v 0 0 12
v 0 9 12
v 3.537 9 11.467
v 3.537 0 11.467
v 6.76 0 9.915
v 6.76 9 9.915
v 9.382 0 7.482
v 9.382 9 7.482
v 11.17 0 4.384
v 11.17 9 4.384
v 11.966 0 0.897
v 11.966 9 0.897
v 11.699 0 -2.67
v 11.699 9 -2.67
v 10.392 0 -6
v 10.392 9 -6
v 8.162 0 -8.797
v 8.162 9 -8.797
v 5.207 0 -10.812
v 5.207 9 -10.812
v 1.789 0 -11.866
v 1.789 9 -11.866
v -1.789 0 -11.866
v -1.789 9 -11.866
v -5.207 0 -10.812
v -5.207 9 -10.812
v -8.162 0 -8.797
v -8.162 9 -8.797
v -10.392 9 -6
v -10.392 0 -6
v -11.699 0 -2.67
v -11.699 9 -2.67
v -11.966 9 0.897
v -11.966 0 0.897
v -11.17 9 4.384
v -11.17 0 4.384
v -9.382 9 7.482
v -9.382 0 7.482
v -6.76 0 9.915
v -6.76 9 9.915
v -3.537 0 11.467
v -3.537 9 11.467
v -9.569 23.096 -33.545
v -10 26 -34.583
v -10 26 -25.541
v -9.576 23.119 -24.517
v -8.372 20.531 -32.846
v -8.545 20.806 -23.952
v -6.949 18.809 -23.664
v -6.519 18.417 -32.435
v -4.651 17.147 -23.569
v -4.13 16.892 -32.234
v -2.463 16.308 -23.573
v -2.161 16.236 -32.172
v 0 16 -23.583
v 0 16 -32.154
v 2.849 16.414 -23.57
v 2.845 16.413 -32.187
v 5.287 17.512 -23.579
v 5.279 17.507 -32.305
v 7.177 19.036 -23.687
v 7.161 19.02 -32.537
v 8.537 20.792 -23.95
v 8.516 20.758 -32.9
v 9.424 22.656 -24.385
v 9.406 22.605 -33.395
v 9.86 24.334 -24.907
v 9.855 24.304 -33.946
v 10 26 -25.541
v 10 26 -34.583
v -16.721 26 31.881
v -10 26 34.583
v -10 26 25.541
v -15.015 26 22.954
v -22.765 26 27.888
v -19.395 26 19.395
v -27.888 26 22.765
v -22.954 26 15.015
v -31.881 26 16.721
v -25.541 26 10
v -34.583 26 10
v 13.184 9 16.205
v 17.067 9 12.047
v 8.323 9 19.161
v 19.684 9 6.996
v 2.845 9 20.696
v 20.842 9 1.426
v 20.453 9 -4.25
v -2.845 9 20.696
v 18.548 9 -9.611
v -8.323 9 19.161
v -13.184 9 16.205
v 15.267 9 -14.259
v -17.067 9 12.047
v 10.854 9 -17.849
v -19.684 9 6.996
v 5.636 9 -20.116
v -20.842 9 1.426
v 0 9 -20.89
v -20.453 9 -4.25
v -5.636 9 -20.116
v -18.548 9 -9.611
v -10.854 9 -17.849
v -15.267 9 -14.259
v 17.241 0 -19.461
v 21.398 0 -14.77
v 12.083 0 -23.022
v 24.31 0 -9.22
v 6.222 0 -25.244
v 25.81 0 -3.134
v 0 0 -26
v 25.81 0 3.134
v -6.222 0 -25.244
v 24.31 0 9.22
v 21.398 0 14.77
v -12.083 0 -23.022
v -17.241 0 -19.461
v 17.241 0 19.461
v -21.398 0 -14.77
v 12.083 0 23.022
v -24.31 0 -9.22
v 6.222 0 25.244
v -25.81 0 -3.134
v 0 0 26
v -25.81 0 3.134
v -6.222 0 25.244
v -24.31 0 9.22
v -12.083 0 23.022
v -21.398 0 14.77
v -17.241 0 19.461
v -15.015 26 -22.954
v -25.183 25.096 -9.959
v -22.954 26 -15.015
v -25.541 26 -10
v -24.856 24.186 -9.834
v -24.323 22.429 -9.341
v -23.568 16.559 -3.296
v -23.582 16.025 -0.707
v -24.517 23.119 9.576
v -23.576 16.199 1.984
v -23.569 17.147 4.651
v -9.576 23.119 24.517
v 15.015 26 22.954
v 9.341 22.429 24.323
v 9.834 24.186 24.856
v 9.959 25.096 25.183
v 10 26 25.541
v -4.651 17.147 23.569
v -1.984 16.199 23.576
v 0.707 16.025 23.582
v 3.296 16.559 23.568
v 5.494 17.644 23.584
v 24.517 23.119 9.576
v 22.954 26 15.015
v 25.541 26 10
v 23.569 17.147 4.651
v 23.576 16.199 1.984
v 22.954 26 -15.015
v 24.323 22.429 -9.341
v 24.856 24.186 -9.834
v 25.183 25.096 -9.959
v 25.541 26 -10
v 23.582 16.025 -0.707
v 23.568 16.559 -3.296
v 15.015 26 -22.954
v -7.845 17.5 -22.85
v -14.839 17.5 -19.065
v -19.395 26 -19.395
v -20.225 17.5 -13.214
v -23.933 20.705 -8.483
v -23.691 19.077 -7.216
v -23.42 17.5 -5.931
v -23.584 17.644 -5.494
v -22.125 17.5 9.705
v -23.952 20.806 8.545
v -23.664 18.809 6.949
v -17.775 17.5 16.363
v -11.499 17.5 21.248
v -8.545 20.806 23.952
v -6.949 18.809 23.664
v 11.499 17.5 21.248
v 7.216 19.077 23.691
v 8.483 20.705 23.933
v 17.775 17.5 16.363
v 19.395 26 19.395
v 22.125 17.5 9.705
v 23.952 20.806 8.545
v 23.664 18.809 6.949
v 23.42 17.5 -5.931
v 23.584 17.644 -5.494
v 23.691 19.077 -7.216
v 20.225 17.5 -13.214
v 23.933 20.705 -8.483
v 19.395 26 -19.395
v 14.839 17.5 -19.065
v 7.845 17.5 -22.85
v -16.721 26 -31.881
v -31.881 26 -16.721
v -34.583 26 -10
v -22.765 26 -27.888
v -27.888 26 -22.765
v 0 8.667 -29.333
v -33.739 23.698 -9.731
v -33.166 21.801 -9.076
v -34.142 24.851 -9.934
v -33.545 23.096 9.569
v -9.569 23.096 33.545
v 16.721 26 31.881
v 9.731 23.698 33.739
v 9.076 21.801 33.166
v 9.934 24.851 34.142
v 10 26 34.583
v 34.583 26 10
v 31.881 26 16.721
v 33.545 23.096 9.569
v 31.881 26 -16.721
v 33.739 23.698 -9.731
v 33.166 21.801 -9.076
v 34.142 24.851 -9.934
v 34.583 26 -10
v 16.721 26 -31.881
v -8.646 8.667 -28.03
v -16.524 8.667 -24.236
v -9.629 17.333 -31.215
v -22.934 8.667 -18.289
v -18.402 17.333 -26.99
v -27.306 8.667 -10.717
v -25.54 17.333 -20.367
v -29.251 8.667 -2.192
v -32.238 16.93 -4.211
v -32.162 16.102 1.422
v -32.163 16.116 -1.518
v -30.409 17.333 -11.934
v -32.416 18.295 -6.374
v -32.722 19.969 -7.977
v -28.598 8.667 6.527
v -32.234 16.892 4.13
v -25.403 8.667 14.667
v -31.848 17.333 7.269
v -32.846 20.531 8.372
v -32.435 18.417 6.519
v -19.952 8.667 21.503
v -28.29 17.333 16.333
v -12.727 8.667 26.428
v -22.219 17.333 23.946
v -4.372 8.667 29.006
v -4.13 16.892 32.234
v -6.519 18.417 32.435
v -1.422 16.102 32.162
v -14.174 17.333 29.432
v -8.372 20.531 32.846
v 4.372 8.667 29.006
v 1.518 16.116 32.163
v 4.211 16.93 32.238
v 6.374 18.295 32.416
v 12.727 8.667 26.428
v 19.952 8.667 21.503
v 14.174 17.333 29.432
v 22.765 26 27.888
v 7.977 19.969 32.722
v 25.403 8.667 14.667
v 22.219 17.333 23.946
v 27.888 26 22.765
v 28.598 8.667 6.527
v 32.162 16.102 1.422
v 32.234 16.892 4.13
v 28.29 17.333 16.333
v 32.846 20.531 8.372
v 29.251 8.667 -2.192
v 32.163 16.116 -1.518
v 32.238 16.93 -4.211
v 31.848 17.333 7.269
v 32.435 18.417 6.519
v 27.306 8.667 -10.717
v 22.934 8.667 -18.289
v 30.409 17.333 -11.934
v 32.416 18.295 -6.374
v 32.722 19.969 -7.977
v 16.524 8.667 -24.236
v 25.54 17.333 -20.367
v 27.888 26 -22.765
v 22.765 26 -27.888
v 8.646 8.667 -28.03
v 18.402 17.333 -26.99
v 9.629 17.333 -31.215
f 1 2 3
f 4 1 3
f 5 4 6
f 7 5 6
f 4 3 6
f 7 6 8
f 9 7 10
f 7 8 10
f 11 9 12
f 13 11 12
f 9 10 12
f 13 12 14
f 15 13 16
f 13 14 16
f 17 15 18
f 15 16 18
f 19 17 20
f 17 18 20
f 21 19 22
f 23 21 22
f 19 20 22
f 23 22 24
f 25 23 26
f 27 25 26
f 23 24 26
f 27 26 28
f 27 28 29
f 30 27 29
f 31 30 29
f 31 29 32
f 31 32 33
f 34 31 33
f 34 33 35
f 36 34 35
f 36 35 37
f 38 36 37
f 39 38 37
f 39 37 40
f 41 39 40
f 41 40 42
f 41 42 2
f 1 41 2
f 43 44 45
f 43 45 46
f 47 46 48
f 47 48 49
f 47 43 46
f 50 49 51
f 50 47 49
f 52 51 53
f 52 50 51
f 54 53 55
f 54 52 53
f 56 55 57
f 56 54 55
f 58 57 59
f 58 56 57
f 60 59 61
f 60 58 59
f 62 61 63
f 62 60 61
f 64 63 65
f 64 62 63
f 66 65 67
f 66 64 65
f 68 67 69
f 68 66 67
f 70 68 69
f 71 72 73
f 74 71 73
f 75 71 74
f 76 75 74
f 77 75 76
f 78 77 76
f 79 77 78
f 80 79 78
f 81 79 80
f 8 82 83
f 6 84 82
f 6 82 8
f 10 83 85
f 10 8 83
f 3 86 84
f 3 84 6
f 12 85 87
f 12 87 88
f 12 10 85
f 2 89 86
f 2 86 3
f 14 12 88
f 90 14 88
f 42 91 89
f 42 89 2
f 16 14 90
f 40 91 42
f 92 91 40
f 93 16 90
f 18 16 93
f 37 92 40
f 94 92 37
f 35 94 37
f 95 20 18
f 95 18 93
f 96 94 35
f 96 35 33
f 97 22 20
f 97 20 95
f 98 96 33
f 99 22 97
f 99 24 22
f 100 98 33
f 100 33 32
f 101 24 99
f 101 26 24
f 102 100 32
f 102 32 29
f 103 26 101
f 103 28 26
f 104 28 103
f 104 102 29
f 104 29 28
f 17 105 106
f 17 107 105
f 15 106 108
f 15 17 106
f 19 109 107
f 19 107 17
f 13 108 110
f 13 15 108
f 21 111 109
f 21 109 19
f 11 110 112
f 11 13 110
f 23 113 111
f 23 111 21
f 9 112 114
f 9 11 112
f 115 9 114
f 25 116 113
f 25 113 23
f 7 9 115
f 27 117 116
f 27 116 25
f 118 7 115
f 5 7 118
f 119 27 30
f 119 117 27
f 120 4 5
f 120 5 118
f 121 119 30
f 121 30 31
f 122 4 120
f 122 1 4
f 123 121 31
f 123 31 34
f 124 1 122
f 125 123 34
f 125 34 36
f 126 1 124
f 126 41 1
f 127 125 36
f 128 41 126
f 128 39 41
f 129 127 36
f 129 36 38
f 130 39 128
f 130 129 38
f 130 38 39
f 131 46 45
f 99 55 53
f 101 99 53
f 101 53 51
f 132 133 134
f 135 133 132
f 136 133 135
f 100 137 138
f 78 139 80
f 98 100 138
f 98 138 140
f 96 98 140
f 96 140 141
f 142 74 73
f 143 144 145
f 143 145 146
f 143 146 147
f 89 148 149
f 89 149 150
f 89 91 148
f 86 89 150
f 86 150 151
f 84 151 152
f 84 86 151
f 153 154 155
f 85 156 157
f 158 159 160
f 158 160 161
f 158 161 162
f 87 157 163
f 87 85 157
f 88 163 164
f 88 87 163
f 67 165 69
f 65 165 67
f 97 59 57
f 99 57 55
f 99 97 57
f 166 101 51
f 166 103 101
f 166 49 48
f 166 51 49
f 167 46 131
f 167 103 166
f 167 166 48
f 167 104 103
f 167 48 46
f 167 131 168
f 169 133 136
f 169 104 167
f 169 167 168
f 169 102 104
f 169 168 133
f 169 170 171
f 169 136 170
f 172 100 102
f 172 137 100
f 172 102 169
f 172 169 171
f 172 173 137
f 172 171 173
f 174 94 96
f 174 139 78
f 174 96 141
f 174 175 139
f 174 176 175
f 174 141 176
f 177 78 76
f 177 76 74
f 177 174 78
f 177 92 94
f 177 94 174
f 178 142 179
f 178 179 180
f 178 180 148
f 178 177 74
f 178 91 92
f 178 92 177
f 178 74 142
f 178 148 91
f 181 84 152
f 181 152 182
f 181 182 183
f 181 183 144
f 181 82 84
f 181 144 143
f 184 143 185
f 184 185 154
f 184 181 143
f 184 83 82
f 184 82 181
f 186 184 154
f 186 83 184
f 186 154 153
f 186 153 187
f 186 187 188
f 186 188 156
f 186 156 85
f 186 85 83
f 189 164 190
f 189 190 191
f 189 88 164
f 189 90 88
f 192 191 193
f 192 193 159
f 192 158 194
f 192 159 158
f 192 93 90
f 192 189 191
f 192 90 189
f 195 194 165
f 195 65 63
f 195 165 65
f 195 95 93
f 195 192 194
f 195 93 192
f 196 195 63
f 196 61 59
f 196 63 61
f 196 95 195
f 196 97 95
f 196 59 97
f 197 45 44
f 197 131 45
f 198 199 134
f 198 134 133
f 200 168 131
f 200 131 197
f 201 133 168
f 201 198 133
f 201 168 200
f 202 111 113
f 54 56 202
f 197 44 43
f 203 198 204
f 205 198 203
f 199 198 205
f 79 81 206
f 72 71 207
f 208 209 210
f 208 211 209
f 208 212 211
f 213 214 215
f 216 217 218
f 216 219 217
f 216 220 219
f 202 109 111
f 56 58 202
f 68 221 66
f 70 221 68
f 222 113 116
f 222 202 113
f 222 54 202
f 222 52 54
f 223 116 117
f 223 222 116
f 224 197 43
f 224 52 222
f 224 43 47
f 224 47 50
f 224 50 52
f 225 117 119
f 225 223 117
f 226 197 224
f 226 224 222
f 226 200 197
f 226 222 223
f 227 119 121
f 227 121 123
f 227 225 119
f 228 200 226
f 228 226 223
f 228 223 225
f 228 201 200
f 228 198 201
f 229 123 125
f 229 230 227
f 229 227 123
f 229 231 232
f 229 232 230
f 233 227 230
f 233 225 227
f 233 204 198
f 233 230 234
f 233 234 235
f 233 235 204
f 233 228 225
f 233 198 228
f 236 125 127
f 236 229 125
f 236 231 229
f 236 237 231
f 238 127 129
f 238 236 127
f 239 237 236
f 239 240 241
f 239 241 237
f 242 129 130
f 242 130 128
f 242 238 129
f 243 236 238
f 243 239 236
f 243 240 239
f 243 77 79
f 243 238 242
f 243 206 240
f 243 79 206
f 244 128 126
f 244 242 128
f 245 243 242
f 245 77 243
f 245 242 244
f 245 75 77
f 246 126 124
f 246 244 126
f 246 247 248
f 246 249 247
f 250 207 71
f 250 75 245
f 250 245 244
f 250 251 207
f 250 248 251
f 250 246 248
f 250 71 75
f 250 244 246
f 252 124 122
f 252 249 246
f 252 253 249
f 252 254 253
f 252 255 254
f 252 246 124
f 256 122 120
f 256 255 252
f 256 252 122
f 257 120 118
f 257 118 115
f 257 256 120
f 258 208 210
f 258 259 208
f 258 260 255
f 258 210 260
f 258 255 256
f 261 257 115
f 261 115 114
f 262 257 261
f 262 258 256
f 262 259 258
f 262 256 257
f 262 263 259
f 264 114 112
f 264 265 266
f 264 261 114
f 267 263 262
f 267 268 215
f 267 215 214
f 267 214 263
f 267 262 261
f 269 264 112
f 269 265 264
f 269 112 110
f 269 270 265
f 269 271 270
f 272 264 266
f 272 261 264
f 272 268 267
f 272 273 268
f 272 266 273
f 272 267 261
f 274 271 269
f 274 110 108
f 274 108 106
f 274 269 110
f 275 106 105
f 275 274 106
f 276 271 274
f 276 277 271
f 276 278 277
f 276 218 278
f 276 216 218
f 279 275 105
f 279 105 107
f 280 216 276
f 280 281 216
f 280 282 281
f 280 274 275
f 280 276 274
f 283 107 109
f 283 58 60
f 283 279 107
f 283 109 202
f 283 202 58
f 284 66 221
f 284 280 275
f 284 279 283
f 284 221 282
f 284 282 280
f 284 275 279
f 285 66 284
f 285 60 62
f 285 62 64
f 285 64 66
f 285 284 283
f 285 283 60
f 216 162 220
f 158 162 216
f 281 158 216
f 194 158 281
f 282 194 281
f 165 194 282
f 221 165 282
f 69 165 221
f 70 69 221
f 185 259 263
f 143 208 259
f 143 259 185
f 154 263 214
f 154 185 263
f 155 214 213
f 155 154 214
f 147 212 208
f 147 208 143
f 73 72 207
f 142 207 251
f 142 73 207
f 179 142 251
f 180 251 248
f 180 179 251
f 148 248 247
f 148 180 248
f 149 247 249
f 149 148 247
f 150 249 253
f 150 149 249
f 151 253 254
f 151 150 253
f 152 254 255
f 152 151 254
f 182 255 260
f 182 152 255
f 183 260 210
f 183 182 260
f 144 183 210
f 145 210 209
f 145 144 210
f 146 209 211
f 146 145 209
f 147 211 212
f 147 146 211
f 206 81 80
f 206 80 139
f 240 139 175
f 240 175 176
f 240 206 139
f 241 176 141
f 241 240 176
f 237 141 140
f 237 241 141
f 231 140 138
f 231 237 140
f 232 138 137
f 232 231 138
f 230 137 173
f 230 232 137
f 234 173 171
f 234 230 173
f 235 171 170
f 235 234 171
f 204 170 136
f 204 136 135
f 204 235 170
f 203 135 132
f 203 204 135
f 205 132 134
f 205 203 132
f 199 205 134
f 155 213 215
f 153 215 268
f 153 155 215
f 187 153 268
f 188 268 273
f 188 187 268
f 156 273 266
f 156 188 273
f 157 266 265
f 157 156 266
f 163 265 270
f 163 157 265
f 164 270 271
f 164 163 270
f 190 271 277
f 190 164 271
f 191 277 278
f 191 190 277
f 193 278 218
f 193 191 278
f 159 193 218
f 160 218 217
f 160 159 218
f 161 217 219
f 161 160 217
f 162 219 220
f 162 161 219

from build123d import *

# Parameters (mm, degrees)
CUT_EXTRUDE1_DEPTH      = 58.166423712
CUT_EXTRUDE1_DEPTH_BACK = 58.166423712
SKETCH11_R              = 10
CUT_EXTRUDE2_DEPTH      = 57.284989289
CUT_EXTRUDE2_DEPTH_BACK = 57.284989289
SKETCH12_R              = 10
SKETCH13_R              = 12
CUT_EXTRUDE3_DEPTH      = 26


with BuildPart() as part:
    # Sketch9 → Revolve2 (revolve)
    with BuildSketch(Plane.XY, mode=Mode.PRIVATE) as revolve2_sk:
        Polygon((0, 9), (0, 0), (26, 0), (36, 26), (27.428684137, 26), (20.890222599, 9), align=None)
    revolve(revolve2_sk.sketch.rotate(Axis((0, 0, 0), (0, 1, 0)), 90), axis=Axis((0, 0, 0), (0, 1, 0)))

    # Sketch11 → Cut-Extrude1 (cut, two sides: drawn at the far end of the back side and taken through both)
    with BuildSketch(Plane.XY.offset(-CUT_EXTRUDE1_DEPTH_BACK)):
        with Locations((0, 26)):
            Circle(SKETCH11_R)
    extrude(amount=CUT_EXTRUDE1_DEPTH + CUT_EXTRUDE1_DEPTH_BACK, mode=Mode.SUBTRACT)

    # Sketch12 → Cut-Extrude2 (cut, two sides: drawn at the far end of the back side and taken through both)
    with BuildSketch(Plane(origin=(0, 0, 0), x_dir=(0, 0, -1), z_dir=(1, 0, 0)).offset(-CUT_EXTRUDE2_DEPTH_BACK)):
        with Locations((0, 26)):
            Circle(SKETCH12_R)
    extrude(amount=CUT_EXTRUDE2_DEPTH + CUT_EXTRUDE2_DEPTH_BACK, mode=Mode.SUBTRACT)

    # Sketch13 → Cut-Extrude3 (cut)
    with BuildSketch(Plane(origin=(0, 9, 0), x_dir=(1, 0, 0), z_dir=(0, 1, 0))):
        with Locations(Location((0, 0, 0), (0, 0, 270))):
            Circle(SKETCH13_R)
    extrude(amount=-CUT_EXTRUDE3_DEPTH, mode=Mode.SUBTRACT)


solid = part.part
